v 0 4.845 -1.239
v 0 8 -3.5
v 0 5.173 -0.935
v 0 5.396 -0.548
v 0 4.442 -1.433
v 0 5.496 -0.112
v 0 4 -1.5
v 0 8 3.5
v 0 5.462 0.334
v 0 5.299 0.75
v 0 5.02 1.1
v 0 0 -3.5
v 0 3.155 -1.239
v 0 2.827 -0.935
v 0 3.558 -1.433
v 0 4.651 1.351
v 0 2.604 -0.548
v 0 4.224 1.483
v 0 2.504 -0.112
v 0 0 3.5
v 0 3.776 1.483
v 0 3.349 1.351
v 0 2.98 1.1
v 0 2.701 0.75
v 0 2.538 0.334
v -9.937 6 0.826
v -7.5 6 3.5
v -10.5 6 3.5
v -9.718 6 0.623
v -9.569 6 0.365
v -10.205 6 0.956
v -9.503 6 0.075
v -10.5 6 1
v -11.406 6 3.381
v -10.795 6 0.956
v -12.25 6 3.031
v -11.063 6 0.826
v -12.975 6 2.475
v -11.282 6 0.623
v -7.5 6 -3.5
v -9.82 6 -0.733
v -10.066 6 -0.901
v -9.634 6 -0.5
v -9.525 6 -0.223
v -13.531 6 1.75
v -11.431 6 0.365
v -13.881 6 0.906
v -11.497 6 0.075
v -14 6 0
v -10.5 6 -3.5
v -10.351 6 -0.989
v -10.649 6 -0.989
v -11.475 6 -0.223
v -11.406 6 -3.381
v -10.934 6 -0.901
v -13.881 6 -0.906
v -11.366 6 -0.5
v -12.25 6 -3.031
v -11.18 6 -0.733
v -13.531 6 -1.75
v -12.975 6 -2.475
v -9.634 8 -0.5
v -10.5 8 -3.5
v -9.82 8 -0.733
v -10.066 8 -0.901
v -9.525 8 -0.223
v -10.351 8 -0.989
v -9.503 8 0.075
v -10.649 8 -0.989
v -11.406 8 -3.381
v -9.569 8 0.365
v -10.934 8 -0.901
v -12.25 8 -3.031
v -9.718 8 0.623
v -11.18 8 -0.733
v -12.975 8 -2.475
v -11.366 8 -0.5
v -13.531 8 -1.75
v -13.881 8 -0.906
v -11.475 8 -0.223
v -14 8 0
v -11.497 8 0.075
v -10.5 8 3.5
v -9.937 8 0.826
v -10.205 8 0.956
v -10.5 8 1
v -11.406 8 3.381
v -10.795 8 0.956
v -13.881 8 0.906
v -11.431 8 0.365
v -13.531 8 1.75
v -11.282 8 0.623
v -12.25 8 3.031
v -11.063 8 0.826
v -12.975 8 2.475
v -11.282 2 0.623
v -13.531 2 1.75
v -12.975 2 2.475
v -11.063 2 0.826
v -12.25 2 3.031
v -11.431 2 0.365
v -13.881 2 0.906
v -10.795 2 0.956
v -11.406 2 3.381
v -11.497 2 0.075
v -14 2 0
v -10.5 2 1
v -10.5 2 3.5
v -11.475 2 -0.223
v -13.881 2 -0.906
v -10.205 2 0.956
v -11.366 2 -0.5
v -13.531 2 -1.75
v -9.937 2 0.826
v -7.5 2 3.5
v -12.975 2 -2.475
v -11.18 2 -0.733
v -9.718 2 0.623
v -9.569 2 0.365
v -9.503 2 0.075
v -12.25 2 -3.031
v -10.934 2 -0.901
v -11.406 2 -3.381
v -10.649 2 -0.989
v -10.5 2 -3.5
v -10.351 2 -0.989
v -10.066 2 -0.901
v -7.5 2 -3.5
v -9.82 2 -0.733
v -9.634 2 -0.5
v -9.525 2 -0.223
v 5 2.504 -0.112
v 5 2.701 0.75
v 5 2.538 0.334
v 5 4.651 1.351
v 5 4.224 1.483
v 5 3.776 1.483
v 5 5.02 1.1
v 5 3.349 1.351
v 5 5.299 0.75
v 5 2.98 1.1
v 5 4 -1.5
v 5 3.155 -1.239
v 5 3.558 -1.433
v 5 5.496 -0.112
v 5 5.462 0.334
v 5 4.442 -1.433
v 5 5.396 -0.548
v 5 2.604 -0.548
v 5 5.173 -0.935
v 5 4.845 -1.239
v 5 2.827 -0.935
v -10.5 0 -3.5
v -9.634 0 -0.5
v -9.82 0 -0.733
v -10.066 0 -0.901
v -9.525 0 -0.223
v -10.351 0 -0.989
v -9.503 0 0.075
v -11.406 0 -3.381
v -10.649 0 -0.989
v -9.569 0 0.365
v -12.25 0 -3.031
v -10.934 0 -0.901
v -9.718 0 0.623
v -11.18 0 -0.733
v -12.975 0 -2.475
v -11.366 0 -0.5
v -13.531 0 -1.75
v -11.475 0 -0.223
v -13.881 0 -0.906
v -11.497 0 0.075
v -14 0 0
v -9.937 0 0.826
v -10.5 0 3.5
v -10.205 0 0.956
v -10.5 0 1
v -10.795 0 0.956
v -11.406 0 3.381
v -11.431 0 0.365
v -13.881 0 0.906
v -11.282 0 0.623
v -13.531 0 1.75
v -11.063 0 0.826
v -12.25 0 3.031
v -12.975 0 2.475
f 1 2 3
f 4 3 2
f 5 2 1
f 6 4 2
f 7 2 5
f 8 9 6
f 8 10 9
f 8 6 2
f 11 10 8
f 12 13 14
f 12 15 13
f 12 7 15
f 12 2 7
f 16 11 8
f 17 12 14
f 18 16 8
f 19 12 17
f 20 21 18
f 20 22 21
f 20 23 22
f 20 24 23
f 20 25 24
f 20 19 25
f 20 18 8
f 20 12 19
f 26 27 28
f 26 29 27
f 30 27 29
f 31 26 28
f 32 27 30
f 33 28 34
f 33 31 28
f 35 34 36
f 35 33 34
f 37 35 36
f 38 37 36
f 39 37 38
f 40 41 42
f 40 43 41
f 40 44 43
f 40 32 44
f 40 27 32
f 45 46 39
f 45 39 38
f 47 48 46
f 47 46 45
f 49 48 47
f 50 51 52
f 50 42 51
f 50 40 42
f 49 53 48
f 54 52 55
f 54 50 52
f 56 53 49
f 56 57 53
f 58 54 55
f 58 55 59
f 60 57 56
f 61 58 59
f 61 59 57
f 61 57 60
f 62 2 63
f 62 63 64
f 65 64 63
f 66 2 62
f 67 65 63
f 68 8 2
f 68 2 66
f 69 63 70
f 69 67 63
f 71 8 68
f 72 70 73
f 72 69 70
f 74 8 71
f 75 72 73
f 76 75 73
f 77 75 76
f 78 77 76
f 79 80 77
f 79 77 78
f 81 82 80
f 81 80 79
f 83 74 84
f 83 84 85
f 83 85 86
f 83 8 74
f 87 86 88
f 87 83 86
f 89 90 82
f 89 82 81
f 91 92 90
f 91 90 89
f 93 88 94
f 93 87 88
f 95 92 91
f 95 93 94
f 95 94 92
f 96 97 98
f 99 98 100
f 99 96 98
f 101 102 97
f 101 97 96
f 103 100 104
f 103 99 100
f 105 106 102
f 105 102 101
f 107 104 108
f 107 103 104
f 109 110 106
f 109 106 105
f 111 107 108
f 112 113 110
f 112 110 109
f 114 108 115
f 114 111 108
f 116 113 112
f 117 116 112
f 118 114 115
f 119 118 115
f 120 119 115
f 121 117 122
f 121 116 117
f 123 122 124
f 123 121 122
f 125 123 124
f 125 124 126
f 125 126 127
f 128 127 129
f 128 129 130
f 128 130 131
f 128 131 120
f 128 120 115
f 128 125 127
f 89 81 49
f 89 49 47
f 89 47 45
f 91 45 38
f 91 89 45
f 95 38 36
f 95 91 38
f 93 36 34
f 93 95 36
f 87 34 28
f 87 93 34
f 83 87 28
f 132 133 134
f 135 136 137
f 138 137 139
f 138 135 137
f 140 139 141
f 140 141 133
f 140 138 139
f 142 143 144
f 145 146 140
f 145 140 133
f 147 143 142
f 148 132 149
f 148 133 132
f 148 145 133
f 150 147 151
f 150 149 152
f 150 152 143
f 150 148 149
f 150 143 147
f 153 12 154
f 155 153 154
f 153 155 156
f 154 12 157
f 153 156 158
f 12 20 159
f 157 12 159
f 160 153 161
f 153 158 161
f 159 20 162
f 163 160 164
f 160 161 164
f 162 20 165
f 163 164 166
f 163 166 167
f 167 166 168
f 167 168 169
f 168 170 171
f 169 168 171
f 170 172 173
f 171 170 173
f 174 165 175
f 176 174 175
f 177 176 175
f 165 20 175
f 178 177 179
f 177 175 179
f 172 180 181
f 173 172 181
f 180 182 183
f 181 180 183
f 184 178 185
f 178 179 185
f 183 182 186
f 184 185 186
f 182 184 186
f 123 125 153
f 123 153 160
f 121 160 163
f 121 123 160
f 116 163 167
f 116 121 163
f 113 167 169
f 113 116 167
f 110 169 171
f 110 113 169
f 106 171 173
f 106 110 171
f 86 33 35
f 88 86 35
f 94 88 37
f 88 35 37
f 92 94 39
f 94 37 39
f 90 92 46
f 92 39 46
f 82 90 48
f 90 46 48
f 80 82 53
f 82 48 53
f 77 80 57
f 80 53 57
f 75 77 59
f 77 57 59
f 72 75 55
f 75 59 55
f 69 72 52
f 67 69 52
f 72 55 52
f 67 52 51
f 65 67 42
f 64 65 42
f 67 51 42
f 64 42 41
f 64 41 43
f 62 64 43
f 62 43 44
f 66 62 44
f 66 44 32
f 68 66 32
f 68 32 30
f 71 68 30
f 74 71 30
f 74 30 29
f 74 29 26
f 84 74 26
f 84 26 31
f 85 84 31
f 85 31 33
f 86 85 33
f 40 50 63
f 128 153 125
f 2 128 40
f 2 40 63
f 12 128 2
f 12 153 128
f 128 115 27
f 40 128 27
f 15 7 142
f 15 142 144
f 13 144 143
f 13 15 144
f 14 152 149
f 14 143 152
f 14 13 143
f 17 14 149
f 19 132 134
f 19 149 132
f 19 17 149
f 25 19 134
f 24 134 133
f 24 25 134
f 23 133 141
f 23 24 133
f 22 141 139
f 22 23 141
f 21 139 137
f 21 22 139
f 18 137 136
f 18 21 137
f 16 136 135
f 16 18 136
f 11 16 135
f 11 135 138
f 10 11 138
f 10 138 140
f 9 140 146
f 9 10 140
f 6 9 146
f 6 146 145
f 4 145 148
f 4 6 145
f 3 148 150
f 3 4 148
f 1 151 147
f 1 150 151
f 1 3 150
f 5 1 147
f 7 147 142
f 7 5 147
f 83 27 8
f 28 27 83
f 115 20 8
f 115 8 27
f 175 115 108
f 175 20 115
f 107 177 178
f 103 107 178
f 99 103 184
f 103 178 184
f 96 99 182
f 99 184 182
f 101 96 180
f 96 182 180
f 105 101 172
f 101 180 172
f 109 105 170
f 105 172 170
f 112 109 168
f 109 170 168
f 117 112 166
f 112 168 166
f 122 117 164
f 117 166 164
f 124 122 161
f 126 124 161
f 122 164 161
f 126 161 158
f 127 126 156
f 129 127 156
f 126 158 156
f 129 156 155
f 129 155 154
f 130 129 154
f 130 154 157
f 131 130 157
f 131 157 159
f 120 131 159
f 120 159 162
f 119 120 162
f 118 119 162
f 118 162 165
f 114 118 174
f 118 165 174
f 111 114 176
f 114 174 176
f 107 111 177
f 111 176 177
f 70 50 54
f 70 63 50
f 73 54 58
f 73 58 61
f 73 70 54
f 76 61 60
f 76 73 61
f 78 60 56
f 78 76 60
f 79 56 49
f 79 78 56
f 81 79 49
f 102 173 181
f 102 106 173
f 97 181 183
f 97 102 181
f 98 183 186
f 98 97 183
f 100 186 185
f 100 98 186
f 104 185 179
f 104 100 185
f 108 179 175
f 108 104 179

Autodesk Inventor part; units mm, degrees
ref_plane "YZ Plane" through (0, 0, 0) normal (1, 0, 0) x (0, 1, 0)
ref_plane "XZ Plane" through (0, 0, 0) normal (0, 1, 0) x (-1, 0, 0)
ref_plane "XY Plane" through (0, 0, 0) normal (0, 0, 1) x (1, 0, 0)
sketch "Skizze1" plane through (0, 0, 0) normal (0, 1, 0) x (-1, 0, 0)
  line L0 (0, 3.5) -> (14, 3.5)
  line L1 (14, 3.5) -> (14, -3.5)
  line L2 (14, -3.5) -> (0, -3.5)
  line L3 (0, -3.5) -> (0, 3.5)
  point P0 (0, 0)
  point P1 (0, 0)
  dimension "d0" = 7
  dimension "d1" = 14
extrude "Extrusion1" add sketch "Skizze1" along normal blind 8
fillet "Rundung1" radius 3.5 2 edges at (-14, 4, -3.5) (-14, 4, 3.5)
sketch "Skizze2" plane through (0, 8, 0) normal (0, 1, 0) x (1, 0, 0)
  arc A0 (-10.5, 3.5) -> (-10.5, -3.5) centre (-10.5, 0) ccw projected
  point P0 (0, 0)
hole "Bohrung1" at (-10.5, 8, 0) direction (0, -1, 0) diameter 2 depth 8
sketch "Skizze3" plane through (0, 0, -3.5) normal (0, 0, -1) x (-1, 0, 0)
  line L0 (7.5, 6) -> (16, 6)
  line L1 (16, 6) -> (16, 2)
  line L2 (16, 2) -> (7.5, 2)
  line L3 (7.5, 2) -> (7.5, 6)
  line L4 (14, 0) -> (14, 8) projected
  line L5 (0, 0) -> (0, 8) projected
  point P0 (7.5, 4)
  point P1 (0, 4)
  point P2 (11.75, 2)
  point P3 (16, 4)
  dimension "d12" = 6.5
  dimension "d13" = 4
  dimension "d14" = 2
extrude "Extrusion2" cut sketch "Skizze3" against normal up to surface (7 mm away)
sketch "Skizze4" plane through (0, 0, 3.5) normal (1, 0, 0) x (0, 0, -1)
  circle A0 centre (3.5, 4) radius 1.5
  line L0 (7, 0) -> (7, 8) projected
  line L1 (0, 0) -> (7, 0) projected
  point P0 (3.5, 0)
  point P1 (7, 4)
  point P2 (3.5, 0)
  dimension "d17" = 3
extrude "Extrusion3" add sketch "Skizze4" along normal blind 5
thread "Gewinde1" size "M3x0.5" class "6g" standard "ISO Metric profile" length 18
properties part number "25"
